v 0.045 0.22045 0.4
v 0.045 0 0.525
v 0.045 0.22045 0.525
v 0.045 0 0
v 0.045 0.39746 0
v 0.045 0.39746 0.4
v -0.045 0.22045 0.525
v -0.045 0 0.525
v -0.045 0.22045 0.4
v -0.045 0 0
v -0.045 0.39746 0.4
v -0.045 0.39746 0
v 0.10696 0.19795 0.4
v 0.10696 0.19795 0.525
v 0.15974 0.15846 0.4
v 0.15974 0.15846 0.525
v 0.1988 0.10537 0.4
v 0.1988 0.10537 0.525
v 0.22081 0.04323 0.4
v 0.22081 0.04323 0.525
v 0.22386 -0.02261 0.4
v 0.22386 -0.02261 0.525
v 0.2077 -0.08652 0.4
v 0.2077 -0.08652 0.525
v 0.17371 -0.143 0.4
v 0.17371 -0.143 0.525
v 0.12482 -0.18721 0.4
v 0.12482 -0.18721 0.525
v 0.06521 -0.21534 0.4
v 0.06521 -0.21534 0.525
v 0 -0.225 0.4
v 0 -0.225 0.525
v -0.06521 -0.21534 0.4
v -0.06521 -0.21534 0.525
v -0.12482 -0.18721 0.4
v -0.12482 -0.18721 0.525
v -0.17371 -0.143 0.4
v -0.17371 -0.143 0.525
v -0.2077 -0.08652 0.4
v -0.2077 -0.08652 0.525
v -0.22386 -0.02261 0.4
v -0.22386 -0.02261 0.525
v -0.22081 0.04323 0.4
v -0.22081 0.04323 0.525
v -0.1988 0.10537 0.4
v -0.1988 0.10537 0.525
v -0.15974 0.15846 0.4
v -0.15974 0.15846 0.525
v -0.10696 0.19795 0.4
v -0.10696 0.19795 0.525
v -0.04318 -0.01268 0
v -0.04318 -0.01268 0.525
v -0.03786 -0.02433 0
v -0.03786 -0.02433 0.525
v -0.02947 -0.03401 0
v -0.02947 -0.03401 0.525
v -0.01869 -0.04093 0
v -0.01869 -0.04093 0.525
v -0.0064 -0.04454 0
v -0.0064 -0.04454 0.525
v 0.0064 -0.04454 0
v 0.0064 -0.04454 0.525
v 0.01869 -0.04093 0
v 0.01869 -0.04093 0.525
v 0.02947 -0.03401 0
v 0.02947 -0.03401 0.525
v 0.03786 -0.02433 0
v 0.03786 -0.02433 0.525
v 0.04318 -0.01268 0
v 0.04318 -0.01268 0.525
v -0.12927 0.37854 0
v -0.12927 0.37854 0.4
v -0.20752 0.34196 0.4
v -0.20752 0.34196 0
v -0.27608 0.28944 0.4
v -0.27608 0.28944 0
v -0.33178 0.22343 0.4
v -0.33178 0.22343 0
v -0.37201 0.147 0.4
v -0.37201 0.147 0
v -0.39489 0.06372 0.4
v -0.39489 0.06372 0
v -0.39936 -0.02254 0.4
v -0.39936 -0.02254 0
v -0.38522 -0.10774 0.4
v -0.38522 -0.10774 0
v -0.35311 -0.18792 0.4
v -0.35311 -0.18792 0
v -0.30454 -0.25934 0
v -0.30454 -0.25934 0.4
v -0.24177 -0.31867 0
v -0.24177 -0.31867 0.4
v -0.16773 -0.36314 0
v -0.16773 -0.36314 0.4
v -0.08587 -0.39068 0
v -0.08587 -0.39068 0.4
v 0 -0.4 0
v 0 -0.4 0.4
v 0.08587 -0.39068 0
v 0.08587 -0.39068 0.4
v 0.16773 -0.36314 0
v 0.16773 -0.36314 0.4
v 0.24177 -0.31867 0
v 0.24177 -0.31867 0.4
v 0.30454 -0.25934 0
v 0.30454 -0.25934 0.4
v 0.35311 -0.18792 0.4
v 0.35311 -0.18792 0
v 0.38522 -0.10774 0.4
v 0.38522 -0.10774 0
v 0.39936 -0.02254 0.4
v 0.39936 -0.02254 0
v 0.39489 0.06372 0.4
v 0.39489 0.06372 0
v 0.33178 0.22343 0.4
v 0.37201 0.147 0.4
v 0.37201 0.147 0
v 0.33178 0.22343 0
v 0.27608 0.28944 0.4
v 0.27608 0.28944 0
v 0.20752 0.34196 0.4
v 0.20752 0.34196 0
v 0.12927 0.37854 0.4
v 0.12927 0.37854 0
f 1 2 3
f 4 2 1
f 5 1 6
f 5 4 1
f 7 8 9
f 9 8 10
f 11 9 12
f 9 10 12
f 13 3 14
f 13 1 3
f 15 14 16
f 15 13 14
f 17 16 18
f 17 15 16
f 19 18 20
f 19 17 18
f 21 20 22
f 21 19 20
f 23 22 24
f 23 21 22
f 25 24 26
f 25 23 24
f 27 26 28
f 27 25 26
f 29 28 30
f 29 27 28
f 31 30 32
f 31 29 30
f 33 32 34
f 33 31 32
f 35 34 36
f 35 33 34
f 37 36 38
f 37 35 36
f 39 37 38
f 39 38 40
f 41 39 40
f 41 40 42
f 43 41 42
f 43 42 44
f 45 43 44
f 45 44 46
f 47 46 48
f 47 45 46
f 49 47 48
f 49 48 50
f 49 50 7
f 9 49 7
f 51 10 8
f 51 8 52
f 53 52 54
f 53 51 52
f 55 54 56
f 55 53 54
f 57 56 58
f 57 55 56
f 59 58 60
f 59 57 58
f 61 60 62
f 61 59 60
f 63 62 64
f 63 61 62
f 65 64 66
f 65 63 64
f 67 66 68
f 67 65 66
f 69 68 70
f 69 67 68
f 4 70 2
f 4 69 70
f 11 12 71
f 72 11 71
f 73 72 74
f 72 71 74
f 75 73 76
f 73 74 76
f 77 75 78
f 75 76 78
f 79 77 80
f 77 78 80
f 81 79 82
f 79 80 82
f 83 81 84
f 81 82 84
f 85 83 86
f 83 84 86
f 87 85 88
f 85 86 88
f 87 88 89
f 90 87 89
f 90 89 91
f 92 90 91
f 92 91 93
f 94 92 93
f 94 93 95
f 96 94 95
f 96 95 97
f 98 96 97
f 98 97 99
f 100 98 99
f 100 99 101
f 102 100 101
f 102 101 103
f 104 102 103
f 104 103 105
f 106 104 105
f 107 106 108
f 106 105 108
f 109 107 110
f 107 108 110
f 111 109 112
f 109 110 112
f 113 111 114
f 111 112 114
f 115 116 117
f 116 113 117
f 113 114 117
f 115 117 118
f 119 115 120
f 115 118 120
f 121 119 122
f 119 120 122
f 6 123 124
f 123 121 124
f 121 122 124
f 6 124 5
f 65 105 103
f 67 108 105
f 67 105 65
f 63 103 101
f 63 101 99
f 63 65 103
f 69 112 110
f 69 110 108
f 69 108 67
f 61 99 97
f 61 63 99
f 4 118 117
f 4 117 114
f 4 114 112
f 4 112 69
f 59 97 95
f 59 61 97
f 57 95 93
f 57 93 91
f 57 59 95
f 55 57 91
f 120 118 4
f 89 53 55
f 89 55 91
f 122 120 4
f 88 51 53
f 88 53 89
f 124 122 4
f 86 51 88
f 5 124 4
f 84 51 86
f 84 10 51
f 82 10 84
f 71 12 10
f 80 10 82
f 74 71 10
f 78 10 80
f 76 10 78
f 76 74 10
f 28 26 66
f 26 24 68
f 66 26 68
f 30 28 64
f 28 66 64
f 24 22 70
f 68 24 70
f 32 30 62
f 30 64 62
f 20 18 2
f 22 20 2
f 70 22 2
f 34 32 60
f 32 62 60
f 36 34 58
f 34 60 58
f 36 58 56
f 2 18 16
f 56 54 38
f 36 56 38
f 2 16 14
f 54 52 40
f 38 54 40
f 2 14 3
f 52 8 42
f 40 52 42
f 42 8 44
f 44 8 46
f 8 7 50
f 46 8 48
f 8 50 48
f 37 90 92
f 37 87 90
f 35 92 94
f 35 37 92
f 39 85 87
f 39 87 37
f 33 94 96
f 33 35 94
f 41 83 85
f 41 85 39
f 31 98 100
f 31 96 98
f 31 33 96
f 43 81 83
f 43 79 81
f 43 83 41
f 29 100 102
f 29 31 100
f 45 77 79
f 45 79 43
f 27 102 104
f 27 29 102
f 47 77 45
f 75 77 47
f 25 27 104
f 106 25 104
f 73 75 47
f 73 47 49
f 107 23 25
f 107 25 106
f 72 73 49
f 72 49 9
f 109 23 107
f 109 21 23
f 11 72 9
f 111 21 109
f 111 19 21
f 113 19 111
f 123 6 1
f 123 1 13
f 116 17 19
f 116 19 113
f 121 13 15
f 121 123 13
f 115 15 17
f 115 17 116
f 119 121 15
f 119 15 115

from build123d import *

# Parameters (mm, degrees)
SKETCH1_R           = 0.4
BOSS_EXTRUDE1_DEPTH = 0.4
SKETCH2_R           = 0.225
BOSS_EXTRUDE2_DEPTH = 0.525
SKETCH3_R           = 0.045
CUT_EXTRUDE1_DEPTH  = 1.771767452
SKETCH5_W           = 0.09
SKETCH5_H           = 0.5
CUT_EXTRUDE2_DEPTH  = 1.771767452


with BuildPart() as part:
    # Sketch1 → Boss-Extrude1 (new body)
    with BuildSketch(Plane.XY):
        Circle(SKETCH1_R)
    extrude(amount=BOSS_EXTRUDE1_DEPTH)

    # Sketch2 → Boss-Extrude2 (add)
    with BuildSketch(Plane(origin=(0, 0, 0), x_dir=(-1, 0, 0), z_dir=(0, 0, -1))):
        Circle(SKETCH2_R)
    extrude(amount=-BOSS_EXTRUDE2_DEPTH)

    # Sketch3 → Cut-Extrude1 (cut, through all)
    with BuildSketch(Plane.XY):
        Circle(SKETCH3_R)
    extrude(amount=CUT_EXTRUDE1_DEPTH, mode=Mode.SUBTRACT)

    # Sketch5 → Cut-Extrude2 (cut, through all)
    with BuildSketch(Plane(origin=(0, 0, 0), x_dir=(-1, 0, 0), z_dir=(0, 0, -1))):
        with Locations((0, 0.25)):
            Rectangle(SKETCH5_W, SKETCH5_H)
    extrude(amount=-CUT_EXTRUDE2_DEPTH, mode=Mode.SUBTRACT)


solid = part.part
